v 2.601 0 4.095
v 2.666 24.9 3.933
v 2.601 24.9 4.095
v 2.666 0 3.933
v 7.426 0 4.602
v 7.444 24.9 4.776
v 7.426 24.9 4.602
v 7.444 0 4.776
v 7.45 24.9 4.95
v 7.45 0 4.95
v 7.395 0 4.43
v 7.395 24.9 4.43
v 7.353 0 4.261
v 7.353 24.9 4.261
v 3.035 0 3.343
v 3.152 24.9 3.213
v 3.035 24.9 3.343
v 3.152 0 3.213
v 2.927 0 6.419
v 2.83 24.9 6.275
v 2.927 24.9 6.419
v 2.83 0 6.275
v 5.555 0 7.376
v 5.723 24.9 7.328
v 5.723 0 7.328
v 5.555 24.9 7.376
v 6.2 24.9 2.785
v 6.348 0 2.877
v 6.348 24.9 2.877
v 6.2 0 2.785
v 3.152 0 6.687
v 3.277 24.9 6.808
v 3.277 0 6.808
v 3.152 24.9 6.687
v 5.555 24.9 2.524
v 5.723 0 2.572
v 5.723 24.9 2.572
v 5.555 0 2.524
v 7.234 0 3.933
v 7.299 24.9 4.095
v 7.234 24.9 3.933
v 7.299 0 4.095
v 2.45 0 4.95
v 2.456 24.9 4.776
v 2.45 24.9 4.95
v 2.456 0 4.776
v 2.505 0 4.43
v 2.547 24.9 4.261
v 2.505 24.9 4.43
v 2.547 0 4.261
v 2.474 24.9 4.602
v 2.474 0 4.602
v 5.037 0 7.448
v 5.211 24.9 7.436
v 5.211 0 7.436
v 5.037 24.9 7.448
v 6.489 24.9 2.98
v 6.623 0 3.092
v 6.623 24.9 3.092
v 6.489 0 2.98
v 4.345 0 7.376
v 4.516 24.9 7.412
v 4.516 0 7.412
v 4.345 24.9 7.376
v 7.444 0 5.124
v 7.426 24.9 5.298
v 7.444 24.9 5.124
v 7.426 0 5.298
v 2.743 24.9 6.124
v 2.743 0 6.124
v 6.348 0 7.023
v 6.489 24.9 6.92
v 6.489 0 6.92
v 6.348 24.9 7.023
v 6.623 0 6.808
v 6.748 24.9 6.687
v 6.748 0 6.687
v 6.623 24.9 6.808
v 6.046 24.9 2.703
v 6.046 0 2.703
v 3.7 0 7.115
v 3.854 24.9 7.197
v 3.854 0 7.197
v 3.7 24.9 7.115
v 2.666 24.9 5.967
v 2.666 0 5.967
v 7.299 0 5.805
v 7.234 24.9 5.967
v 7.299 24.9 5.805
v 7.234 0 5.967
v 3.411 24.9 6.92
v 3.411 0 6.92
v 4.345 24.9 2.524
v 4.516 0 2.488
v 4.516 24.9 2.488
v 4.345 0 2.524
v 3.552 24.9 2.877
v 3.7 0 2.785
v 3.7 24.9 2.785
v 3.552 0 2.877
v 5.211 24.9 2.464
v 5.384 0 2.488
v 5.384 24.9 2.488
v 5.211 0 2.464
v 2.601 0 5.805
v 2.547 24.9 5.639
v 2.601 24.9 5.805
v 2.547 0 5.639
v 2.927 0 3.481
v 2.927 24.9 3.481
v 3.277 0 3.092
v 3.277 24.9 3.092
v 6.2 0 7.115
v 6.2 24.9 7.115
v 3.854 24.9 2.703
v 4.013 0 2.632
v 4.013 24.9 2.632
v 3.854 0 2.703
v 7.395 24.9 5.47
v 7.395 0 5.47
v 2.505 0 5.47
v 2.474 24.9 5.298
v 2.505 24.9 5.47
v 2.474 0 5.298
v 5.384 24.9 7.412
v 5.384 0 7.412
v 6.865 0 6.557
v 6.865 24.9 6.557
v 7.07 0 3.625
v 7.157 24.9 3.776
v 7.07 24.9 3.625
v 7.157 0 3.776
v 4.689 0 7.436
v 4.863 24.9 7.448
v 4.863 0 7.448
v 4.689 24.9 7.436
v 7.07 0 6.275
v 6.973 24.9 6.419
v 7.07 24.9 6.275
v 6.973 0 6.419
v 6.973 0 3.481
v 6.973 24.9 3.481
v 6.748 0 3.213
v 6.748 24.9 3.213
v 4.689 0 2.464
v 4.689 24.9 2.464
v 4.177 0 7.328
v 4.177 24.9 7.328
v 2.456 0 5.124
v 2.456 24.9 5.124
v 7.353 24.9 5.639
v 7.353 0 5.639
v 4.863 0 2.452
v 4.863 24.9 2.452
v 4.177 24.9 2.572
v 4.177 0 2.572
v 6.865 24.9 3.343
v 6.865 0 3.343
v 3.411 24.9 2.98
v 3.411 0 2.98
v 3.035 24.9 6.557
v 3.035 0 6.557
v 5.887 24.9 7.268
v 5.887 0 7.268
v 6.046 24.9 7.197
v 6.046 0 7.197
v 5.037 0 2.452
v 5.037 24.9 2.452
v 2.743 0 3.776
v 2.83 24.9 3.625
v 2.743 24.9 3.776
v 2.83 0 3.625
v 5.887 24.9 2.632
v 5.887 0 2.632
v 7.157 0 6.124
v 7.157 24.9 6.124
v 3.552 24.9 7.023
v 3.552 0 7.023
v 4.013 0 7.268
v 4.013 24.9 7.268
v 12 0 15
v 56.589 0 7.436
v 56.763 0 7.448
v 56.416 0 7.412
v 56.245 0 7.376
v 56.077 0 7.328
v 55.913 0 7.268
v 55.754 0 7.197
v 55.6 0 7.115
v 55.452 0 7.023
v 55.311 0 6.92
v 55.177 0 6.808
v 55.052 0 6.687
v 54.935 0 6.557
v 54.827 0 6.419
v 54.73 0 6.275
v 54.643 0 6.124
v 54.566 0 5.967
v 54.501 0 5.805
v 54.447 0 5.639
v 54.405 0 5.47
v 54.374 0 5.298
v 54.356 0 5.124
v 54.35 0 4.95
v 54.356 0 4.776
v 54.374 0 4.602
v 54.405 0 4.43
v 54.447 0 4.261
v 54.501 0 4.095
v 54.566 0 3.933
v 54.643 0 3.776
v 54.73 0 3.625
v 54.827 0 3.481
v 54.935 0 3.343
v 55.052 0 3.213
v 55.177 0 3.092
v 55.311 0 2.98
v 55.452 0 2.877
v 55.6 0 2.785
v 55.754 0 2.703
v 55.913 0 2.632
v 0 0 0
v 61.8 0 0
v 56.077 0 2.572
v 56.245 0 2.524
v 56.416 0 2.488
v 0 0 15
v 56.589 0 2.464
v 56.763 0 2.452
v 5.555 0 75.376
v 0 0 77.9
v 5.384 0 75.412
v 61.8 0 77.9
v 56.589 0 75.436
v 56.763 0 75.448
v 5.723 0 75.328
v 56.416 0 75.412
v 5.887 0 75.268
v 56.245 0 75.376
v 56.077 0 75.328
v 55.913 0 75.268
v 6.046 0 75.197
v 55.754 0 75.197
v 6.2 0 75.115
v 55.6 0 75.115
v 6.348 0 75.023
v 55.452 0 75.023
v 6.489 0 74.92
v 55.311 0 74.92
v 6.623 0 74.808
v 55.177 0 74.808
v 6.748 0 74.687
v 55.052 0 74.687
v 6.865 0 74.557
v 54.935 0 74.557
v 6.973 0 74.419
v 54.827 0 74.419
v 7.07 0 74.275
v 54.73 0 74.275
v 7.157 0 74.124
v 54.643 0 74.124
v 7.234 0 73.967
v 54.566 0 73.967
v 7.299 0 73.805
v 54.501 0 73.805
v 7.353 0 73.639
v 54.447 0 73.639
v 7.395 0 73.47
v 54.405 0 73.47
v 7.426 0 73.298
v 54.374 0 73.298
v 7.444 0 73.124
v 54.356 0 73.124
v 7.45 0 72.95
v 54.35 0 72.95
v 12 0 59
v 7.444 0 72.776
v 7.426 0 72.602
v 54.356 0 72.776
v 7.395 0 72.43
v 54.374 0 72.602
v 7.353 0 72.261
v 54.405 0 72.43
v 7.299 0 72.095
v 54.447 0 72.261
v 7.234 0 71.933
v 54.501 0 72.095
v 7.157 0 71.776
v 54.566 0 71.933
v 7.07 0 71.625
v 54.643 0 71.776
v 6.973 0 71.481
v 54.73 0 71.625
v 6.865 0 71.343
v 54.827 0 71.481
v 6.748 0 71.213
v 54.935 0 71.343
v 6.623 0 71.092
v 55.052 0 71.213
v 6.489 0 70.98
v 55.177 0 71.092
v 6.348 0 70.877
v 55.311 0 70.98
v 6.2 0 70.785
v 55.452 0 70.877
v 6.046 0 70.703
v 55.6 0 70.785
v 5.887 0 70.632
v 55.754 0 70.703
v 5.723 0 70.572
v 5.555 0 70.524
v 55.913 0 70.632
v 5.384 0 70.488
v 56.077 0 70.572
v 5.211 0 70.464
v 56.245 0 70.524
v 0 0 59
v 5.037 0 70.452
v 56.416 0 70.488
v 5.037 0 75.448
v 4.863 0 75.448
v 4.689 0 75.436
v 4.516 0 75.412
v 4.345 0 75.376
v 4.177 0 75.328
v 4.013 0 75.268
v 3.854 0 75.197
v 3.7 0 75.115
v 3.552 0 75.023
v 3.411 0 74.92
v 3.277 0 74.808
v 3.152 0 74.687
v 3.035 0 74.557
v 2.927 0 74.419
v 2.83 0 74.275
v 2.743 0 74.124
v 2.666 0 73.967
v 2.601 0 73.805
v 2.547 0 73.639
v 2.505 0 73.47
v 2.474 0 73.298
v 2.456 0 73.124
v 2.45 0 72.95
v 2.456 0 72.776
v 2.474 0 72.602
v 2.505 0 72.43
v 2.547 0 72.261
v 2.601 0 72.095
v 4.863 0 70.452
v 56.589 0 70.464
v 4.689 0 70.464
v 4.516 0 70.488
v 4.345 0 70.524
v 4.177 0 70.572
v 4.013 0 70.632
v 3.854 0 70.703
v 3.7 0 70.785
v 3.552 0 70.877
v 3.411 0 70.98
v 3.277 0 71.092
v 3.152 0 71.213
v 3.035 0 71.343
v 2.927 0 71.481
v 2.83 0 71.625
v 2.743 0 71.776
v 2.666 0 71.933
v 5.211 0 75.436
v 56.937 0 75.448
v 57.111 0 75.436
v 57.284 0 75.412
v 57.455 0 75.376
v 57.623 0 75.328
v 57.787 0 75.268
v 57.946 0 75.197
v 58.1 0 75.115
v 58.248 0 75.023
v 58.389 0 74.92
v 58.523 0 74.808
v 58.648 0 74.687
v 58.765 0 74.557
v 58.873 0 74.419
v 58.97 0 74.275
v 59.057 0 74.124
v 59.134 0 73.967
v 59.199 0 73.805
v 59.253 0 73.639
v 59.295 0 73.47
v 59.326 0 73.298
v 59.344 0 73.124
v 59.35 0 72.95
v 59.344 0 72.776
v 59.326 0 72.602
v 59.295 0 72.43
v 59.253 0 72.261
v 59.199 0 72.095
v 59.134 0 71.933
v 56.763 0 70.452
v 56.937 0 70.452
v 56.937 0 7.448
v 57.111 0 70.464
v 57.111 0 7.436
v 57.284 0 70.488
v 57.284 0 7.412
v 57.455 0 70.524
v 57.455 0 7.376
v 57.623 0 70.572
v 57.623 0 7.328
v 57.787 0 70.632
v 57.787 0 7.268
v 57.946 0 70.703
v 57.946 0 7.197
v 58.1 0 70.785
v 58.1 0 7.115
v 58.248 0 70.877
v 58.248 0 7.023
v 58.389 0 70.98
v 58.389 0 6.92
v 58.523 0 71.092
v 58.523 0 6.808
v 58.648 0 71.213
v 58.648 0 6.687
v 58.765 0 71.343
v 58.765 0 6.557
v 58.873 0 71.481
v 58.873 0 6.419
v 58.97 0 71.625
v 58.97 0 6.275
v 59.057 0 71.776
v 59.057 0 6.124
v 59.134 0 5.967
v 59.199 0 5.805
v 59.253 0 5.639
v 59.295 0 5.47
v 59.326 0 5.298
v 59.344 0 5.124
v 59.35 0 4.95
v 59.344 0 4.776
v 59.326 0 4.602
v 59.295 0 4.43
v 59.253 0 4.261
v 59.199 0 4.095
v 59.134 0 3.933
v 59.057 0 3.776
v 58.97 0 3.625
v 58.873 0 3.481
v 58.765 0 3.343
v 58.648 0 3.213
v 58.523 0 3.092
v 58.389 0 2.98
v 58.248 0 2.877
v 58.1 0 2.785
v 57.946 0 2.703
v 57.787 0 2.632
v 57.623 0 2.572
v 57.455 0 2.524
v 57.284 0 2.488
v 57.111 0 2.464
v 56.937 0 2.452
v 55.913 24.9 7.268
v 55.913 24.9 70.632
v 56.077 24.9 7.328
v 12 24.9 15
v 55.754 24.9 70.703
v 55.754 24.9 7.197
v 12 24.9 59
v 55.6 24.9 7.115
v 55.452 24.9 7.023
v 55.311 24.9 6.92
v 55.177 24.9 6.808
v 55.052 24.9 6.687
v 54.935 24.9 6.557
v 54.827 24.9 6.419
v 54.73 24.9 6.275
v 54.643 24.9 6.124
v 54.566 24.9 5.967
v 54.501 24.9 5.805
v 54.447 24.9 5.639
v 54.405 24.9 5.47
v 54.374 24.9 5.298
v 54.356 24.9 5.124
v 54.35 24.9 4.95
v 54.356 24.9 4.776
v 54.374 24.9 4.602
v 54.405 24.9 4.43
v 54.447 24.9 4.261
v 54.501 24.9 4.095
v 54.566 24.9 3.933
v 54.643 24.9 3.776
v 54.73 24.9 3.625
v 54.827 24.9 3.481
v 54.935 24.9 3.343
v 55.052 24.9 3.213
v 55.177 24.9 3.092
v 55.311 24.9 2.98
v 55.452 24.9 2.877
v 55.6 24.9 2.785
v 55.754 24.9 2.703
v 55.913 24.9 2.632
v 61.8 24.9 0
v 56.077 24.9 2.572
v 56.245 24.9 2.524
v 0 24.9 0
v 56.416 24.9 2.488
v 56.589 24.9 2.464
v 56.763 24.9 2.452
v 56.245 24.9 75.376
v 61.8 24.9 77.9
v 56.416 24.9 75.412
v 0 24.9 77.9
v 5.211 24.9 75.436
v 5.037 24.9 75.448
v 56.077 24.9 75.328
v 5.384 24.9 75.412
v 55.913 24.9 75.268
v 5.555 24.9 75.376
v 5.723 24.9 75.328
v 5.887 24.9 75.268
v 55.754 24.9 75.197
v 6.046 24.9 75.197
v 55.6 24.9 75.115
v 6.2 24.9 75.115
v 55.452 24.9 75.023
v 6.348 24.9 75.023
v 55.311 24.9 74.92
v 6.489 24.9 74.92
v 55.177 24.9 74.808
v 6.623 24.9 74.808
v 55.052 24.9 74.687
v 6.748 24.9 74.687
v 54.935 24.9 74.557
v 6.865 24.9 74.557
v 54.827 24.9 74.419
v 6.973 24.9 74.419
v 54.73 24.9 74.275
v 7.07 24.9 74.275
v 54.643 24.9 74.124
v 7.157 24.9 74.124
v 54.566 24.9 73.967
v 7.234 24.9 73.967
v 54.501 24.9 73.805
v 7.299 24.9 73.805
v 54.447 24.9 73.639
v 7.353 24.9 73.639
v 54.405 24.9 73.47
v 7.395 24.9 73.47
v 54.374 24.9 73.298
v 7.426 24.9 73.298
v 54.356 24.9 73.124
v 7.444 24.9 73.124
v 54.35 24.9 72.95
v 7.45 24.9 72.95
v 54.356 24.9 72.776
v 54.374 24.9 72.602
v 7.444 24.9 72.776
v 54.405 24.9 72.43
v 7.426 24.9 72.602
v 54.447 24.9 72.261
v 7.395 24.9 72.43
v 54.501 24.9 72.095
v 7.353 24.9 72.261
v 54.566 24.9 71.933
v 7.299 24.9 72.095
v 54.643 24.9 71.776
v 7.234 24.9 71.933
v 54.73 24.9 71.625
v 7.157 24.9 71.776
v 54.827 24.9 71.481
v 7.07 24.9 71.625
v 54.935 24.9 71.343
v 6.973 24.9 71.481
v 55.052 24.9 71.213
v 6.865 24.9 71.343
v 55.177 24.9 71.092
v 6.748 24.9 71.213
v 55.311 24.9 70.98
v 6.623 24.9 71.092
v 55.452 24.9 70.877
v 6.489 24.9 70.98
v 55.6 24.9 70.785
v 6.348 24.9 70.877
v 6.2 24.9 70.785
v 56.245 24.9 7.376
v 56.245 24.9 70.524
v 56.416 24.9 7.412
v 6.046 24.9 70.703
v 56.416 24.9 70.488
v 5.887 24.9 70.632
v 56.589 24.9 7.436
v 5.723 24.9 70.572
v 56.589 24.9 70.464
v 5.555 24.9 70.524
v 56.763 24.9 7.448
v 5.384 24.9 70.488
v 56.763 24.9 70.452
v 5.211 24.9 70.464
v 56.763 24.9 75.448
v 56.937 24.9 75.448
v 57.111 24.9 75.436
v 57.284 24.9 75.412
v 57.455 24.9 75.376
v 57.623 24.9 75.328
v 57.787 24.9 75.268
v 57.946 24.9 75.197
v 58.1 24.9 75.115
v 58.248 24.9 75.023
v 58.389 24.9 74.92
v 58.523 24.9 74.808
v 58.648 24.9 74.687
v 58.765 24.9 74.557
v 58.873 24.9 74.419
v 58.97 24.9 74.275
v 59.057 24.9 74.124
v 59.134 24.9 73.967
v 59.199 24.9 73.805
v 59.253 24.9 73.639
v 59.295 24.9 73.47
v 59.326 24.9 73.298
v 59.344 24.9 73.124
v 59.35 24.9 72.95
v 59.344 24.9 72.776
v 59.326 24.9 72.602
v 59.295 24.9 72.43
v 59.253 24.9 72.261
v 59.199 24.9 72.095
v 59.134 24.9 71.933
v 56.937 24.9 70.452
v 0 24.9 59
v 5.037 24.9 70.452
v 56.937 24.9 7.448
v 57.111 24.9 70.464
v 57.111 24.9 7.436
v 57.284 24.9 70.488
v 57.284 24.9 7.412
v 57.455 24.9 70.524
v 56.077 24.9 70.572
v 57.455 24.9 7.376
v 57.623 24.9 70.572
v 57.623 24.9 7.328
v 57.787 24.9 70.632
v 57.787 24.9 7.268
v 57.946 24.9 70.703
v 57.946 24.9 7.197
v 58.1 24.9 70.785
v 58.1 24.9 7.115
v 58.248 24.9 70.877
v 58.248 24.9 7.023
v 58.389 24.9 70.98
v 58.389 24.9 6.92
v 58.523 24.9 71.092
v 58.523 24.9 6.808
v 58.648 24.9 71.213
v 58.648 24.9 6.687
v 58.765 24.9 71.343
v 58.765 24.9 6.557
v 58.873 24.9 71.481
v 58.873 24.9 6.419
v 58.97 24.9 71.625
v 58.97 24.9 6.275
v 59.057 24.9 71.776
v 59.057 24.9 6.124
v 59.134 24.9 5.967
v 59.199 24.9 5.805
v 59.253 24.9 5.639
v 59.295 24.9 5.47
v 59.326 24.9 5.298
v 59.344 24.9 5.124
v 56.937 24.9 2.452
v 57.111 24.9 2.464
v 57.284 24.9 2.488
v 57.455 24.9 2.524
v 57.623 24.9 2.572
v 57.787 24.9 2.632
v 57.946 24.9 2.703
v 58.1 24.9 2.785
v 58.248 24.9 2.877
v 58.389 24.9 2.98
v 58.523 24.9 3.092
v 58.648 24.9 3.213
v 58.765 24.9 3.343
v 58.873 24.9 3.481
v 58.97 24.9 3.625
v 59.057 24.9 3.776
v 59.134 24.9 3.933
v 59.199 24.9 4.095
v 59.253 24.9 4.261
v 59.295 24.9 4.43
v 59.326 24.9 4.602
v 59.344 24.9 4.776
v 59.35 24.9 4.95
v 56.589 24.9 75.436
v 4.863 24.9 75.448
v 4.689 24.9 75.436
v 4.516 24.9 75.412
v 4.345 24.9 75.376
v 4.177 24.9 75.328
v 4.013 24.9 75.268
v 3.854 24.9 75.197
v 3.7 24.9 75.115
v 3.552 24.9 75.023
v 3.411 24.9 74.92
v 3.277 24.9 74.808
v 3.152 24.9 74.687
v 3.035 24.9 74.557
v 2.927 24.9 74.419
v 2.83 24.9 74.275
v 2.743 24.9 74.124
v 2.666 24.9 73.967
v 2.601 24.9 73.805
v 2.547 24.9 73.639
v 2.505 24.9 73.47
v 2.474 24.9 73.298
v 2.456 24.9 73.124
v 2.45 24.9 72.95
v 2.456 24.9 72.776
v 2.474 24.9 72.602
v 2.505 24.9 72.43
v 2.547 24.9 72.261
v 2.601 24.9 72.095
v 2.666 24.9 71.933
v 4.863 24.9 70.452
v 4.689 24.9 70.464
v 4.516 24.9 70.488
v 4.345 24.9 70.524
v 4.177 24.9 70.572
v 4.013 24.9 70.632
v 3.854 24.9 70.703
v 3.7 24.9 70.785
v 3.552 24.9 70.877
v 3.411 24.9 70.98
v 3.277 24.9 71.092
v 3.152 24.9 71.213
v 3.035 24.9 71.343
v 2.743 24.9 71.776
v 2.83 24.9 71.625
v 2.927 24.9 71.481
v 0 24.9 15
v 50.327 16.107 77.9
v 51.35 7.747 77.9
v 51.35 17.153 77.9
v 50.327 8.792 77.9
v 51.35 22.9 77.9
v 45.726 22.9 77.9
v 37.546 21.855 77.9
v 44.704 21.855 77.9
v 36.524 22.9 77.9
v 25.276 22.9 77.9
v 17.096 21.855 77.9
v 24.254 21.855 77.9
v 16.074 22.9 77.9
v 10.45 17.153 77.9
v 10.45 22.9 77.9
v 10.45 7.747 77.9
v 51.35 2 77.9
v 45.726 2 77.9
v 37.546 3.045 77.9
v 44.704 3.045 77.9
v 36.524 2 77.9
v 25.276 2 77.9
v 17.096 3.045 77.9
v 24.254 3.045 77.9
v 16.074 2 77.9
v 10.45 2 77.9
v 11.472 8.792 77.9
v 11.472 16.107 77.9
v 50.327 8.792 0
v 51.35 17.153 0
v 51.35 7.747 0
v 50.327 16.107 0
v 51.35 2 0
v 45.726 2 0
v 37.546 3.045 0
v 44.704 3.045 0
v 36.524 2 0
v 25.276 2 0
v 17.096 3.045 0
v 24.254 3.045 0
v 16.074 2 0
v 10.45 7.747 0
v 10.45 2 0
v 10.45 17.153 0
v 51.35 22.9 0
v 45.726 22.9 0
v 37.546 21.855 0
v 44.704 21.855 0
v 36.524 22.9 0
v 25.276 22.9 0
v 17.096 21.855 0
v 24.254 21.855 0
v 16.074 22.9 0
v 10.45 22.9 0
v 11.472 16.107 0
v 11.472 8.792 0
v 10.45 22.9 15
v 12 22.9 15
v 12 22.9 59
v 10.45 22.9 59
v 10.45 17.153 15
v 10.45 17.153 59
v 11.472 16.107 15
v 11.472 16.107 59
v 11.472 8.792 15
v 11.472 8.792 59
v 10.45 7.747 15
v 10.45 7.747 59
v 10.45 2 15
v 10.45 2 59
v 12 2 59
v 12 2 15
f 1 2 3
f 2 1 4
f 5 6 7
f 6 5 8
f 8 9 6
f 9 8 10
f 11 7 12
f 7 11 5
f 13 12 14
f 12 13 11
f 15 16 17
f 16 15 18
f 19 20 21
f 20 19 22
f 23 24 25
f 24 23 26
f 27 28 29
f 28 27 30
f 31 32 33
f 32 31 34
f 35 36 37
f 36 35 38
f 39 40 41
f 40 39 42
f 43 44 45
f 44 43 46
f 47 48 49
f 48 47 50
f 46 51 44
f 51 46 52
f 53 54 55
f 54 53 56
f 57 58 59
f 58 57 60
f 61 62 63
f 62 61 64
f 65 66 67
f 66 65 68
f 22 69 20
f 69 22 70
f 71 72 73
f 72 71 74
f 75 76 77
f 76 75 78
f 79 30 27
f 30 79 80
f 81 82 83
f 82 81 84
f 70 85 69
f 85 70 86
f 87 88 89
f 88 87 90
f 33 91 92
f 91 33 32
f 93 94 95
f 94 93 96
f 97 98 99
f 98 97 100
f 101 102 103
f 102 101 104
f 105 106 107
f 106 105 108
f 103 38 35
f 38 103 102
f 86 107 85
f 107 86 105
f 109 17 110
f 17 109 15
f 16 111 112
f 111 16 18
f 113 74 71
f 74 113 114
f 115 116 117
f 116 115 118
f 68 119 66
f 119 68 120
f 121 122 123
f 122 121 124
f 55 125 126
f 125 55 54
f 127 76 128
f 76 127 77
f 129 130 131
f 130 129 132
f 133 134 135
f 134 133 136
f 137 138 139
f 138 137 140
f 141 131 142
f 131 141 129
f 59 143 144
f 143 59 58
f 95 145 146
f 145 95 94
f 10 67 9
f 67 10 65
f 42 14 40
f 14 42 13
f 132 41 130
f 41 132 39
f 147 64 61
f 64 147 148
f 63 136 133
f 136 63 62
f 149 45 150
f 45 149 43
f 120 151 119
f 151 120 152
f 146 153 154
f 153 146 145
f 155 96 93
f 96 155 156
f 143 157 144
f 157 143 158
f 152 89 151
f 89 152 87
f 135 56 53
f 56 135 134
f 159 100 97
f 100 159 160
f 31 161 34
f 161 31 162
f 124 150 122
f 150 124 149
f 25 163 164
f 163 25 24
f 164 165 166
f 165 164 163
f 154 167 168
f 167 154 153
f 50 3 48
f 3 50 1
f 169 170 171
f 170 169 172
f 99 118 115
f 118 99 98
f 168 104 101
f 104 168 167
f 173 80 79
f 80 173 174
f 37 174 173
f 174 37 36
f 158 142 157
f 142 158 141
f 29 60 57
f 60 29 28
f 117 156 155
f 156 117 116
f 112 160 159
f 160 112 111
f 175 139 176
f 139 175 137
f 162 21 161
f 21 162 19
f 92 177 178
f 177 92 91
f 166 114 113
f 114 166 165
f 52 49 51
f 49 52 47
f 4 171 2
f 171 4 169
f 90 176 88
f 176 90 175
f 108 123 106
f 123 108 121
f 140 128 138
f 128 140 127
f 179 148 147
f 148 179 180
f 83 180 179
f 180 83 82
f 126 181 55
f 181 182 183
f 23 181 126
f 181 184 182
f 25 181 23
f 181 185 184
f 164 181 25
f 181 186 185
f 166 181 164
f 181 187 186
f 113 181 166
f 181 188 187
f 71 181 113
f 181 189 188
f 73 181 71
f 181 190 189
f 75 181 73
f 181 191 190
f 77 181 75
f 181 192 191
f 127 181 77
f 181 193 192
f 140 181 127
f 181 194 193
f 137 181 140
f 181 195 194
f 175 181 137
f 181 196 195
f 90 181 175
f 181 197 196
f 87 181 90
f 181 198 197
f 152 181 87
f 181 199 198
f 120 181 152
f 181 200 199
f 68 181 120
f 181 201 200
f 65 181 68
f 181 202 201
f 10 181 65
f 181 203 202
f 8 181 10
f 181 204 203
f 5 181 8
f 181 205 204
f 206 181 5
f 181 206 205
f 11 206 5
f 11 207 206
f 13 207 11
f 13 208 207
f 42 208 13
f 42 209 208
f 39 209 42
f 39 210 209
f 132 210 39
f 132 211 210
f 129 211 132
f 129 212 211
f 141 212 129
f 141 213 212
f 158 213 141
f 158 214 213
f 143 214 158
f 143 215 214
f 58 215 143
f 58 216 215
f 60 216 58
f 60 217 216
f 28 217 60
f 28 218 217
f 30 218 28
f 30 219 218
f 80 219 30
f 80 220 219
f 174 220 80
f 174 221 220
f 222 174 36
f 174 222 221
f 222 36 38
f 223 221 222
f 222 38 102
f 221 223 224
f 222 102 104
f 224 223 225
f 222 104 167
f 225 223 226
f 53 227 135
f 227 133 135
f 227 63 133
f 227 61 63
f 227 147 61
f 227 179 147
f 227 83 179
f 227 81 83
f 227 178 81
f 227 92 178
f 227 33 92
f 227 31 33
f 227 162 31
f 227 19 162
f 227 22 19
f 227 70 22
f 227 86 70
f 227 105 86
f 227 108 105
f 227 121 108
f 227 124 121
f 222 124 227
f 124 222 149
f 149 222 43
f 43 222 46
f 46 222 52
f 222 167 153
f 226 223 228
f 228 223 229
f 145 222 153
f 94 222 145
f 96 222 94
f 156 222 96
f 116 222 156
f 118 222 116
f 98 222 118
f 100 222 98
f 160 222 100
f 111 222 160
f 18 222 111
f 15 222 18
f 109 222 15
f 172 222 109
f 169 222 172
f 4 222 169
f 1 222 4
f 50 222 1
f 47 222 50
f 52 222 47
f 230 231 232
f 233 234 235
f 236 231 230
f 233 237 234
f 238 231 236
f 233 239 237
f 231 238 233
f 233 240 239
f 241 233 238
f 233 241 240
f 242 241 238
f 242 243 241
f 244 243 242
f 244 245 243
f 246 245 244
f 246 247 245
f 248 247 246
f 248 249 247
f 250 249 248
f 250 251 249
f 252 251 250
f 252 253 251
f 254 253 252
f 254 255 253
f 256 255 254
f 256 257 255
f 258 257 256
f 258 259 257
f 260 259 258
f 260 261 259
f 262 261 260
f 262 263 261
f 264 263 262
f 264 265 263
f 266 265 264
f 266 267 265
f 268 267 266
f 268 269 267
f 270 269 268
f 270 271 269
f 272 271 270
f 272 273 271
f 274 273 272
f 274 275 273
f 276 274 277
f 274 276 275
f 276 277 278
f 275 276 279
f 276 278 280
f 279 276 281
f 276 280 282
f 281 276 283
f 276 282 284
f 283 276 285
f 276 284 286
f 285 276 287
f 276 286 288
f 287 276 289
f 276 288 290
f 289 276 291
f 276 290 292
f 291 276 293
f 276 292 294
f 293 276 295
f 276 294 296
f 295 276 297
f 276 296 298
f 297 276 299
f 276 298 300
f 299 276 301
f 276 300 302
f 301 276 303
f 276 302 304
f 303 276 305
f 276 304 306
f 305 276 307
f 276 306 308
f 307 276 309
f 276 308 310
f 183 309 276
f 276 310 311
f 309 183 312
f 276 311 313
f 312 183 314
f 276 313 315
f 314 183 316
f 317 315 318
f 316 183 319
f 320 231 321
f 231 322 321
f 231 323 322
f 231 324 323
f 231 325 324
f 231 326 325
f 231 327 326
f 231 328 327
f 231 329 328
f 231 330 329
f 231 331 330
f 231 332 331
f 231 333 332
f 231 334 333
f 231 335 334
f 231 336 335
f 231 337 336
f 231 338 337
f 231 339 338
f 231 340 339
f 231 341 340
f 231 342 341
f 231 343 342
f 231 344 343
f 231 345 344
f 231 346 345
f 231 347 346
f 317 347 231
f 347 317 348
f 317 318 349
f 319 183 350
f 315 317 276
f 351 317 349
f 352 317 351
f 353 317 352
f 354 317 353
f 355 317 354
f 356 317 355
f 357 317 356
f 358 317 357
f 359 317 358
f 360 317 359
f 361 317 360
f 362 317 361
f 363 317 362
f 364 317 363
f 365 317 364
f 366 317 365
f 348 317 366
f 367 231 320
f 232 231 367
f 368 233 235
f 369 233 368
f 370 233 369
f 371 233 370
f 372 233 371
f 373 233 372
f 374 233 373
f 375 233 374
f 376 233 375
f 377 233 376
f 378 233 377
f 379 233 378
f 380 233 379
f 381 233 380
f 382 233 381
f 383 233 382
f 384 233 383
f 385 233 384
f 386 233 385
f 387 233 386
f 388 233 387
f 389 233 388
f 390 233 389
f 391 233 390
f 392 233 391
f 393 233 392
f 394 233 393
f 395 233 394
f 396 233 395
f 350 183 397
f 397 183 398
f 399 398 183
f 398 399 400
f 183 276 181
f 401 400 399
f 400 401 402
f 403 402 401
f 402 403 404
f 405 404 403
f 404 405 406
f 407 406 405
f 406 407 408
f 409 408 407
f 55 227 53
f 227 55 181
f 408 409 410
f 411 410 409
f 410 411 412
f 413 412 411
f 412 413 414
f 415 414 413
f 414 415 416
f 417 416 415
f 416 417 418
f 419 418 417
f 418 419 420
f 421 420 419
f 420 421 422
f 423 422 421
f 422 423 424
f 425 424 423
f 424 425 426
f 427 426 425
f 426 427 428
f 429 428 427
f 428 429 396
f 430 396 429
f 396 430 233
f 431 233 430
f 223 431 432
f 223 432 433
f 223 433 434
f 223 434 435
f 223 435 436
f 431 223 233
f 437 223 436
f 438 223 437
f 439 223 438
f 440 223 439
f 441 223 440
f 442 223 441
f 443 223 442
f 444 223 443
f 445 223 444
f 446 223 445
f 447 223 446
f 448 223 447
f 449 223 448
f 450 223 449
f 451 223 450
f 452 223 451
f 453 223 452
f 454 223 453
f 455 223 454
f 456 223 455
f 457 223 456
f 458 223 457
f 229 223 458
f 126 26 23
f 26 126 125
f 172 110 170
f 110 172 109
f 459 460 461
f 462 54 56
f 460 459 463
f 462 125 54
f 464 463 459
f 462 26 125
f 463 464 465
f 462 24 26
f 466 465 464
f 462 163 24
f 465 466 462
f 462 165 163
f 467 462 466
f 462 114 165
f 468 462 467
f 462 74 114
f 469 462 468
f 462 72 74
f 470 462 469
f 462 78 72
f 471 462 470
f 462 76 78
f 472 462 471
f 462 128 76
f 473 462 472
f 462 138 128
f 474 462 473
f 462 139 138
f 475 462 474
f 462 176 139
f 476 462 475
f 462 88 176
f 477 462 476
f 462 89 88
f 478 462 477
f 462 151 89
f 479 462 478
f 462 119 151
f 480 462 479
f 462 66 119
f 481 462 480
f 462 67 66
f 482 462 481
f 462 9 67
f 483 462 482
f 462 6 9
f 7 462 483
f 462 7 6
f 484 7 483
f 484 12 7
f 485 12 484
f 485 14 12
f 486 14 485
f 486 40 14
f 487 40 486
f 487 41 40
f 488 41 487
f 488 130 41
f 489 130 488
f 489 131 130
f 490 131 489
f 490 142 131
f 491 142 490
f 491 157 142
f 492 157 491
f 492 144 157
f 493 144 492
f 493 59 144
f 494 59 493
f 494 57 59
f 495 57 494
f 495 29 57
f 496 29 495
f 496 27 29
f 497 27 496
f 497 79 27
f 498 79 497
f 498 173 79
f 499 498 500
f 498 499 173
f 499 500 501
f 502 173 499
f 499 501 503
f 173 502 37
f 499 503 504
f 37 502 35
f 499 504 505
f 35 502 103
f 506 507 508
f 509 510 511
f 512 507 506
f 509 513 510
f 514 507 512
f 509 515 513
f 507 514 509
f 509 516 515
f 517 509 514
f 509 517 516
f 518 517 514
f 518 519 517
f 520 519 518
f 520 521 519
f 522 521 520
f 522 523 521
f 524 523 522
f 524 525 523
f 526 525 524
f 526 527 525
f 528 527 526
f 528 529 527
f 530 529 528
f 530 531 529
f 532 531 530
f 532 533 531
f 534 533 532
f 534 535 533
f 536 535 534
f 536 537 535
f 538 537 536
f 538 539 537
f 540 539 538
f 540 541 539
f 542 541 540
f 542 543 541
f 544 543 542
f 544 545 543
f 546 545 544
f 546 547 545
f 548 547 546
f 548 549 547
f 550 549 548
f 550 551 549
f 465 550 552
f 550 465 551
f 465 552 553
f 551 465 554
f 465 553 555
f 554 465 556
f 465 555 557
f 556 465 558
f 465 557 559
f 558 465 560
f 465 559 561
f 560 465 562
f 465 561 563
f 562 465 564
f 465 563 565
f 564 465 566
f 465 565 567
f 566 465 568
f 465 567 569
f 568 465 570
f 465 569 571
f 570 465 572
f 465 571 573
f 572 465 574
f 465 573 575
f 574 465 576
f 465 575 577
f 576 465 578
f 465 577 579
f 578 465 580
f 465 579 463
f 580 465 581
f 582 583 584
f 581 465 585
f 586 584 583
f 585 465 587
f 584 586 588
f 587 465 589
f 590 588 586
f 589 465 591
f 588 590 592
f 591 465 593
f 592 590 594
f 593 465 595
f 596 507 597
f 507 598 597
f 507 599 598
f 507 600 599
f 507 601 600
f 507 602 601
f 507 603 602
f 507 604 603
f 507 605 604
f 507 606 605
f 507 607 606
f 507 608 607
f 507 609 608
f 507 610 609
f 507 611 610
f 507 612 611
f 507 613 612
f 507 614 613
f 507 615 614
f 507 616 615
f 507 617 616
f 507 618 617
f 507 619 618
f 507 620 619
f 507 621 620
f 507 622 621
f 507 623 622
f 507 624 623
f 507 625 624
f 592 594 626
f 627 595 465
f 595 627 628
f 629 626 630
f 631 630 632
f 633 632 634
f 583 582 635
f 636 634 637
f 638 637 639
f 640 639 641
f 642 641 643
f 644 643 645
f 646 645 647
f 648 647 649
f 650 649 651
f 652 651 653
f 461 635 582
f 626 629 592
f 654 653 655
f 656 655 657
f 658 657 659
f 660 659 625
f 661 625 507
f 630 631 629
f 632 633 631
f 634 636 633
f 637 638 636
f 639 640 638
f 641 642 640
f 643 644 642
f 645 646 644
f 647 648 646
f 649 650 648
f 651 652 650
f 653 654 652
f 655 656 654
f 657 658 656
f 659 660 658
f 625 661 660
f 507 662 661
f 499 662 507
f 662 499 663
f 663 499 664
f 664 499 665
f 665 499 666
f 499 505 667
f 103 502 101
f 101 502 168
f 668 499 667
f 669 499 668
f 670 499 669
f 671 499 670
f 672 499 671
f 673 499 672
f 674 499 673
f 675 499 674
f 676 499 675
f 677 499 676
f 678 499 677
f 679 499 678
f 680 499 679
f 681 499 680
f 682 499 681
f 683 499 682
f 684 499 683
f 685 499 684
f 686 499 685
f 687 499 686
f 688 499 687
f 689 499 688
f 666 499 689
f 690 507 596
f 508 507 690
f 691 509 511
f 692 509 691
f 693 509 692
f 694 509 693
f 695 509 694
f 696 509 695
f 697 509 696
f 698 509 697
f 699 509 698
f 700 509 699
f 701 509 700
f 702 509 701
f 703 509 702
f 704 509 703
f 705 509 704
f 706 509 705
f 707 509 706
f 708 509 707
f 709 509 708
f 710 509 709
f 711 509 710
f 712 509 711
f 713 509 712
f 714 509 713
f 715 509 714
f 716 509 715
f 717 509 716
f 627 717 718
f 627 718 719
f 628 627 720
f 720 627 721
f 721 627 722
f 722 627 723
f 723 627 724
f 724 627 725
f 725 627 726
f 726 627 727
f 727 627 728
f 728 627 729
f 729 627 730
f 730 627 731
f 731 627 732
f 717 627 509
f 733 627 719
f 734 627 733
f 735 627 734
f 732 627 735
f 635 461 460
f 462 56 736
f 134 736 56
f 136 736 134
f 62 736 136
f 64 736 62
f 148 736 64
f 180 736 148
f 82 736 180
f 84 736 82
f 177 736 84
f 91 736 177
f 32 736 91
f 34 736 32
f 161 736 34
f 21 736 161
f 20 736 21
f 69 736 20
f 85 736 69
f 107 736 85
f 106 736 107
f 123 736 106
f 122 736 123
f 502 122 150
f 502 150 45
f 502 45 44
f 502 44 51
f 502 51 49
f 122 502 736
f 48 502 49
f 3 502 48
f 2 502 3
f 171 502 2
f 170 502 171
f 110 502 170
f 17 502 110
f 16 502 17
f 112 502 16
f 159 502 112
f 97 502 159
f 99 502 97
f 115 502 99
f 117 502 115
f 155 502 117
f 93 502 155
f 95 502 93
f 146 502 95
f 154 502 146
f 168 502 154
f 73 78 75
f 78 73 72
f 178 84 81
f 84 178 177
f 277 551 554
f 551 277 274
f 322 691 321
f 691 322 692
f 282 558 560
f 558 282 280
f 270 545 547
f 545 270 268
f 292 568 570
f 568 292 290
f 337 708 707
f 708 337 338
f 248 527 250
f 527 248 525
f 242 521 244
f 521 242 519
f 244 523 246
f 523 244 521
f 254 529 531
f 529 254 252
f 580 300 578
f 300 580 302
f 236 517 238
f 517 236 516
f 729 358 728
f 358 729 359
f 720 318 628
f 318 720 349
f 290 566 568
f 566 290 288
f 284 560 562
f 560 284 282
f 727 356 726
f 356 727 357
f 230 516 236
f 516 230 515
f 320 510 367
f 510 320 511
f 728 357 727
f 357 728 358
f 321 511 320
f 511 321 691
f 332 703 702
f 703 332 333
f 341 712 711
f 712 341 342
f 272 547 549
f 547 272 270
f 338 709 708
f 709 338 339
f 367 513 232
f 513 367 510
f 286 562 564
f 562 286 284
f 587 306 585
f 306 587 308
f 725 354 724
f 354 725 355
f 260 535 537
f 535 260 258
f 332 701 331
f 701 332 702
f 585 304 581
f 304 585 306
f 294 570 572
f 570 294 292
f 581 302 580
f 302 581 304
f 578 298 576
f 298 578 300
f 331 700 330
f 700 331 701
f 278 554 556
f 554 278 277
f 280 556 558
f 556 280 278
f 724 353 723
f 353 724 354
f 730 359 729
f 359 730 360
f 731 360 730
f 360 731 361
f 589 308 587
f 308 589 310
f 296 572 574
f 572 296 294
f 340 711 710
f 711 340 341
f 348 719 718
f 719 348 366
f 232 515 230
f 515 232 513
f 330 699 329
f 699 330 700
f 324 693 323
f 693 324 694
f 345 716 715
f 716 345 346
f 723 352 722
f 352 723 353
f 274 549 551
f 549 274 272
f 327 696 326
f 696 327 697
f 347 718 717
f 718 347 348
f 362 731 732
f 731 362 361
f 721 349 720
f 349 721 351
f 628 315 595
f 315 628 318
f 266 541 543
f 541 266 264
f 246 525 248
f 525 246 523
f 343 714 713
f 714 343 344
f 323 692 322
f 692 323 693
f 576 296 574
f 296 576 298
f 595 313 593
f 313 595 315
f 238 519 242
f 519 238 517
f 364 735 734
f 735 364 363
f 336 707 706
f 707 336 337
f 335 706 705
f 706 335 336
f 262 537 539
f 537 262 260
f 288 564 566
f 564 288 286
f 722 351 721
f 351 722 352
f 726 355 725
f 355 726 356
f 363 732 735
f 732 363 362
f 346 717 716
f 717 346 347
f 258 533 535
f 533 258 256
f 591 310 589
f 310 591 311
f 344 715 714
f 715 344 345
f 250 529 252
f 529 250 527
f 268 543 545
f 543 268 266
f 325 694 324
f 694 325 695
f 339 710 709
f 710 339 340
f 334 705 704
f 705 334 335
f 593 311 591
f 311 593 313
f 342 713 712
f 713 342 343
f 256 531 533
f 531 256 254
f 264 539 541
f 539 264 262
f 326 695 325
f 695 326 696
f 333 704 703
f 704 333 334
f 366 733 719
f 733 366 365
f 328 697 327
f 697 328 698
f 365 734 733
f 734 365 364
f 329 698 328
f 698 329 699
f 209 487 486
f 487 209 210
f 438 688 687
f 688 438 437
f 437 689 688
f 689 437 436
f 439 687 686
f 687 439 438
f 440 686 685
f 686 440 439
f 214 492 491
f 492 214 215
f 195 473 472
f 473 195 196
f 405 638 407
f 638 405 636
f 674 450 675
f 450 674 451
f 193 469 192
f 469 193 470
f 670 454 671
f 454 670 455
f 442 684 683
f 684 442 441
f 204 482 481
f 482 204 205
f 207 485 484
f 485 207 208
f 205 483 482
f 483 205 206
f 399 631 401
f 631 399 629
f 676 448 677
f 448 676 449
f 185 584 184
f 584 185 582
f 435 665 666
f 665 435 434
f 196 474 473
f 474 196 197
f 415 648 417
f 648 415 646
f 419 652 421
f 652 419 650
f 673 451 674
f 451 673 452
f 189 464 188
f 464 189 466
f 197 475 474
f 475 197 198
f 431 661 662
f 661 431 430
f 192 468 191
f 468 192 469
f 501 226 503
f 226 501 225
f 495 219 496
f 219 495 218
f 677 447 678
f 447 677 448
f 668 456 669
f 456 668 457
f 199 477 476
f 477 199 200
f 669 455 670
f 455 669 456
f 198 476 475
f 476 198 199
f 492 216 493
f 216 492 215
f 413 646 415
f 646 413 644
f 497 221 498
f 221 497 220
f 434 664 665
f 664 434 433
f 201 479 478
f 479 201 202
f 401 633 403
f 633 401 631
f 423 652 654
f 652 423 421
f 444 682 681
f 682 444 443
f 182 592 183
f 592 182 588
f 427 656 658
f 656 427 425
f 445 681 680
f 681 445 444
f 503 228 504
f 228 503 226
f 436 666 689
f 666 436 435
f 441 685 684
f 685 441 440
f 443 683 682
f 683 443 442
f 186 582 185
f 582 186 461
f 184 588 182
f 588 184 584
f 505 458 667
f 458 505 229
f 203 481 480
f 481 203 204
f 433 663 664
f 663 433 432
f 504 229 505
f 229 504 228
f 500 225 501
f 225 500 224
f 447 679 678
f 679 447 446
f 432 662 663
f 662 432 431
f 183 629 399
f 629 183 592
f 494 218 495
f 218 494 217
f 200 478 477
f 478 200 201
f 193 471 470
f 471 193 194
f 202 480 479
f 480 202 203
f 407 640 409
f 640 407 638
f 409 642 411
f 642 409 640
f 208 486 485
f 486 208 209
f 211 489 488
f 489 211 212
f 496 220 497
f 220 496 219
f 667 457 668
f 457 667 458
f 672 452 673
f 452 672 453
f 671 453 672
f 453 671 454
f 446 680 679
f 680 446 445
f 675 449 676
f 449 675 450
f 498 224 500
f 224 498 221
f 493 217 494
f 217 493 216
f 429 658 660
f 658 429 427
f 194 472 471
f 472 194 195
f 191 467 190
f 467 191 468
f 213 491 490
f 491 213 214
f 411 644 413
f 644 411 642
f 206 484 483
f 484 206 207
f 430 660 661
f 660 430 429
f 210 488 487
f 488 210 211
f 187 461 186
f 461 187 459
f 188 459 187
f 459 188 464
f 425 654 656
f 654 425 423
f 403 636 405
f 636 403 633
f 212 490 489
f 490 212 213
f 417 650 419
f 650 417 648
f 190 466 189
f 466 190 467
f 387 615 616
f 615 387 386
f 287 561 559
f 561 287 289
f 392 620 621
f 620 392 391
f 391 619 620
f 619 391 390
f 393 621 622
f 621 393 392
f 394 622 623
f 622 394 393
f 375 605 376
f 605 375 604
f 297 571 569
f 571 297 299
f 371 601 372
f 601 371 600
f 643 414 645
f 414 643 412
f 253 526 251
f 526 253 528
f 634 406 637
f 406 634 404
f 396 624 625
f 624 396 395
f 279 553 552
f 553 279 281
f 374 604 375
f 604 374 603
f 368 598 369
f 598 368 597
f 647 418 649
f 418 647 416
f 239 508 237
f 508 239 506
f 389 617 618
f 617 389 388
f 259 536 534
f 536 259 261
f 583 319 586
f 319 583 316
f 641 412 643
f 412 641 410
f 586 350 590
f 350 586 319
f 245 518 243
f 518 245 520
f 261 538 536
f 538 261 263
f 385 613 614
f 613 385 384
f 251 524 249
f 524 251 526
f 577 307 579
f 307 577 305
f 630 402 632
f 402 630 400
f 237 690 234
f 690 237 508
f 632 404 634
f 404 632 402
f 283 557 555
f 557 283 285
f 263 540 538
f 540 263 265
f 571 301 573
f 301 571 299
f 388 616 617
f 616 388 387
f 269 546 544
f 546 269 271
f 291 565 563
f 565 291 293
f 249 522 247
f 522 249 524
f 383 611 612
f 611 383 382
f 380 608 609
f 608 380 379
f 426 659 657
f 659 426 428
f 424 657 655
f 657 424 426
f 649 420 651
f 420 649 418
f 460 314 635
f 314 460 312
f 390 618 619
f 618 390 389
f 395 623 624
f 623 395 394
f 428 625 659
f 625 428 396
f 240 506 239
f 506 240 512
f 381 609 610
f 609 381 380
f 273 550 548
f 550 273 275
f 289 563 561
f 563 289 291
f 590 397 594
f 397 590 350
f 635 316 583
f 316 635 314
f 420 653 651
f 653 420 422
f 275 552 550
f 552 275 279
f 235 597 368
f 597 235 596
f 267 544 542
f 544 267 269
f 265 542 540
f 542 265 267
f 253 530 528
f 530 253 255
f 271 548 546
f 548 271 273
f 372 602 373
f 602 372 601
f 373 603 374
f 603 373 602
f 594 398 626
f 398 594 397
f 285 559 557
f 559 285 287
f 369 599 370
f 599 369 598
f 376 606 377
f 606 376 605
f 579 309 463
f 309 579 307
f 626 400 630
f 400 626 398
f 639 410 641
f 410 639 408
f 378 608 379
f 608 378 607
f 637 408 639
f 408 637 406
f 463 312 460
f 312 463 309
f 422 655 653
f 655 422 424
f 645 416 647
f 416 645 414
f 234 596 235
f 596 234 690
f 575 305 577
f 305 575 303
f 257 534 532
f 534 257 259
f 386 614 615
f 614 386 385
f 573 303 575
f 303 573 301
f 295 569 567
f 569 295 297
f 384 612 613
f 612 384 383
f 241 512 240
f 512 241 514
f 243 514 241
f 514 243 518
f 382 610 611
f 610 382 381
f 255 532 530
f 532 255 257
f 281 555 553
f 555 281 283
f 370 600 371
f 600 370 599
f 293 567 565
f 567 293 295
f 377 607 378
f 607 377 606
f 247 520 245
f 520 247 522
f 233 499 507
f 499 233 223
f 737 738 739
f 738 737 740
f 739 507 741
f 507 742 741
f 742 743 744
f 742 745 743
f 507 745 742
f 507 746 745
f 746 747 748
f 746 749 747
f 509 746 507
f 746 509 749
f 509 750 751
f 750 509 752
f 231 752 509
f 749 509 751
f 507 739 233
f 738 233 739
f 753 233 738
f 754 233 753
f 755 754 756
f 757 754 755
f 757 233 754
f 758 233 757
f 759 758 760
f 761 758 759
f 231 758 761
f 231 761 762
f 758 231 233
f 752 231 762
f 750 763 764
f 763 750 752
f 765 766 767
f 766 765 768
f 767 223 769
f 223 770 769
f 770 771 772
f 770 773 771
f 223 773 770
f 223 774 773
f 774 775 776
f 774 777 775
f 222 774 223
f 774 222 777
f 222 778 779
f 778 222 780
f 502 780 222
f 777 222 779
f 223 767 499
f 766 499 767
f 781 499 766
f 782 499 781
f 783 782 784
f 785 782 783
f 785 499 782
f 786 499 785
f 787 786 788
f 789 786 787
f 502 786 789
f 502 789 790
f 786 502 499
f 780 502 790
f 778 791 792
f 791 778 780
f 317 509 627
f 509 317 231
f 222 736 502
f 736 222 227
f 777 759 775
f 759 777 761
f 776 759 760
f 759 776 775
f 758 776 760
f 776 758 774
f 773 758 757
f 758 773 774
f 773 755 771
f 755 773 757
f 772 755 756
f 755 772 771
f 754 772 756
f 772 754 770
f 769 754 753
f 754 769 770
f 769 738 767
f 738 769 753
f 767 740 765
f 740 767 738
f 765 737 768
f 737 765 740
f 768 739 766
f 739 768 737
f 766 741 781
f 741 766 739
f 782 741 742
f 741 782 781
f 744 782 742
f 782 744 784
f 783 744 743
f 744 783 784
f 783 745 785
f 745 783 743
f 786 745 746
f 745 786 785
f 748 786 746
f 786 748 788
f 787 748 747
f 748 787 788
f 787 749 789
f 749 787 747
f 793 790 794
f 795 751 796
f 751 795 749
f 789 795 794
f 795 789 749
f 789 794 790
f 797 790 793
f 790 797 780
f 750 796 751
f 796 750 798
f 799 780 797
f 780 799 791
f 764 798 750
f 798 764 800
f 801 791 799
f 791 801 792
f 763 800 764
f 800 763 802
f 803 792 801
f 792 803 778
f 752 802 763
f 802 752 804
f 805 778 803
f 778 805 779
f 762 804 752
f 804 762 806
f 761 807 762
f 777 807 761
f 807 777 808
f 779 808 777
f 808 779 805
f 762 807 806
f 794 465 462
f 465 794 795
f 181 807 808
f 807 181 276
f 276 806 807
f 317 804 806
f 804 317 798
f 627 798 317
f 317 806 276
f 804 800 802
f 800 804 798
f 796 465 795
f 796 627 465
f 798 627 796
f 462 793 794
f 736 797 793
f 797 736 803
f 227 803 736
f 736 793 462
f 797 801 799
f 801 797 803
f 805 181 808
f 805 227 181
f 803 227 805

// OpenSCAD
// file: constants.scad
tolerance=0.7;
oversize = 0.7;
lengthHoleSpacing=20;
wallWidth=5;
//vslotIndentHeight=4;
vslotIndentHeight= 1;
//indentWidthOutside = 6;
indentWidthOutside = 9;
//indentWidthInside = 6;
indentWidthInside = 7;
sectionWidth=20;
profileSize=20;
sectionCountWidth = 2;
sectionCountDepth = 1;
extrusionWidth=profileSize*sectionCountWidth;
extrusionDepth=profileSize*sectionCountDepth;
nema17Width = 42.3;
nema17HoleRadius = 11.05 + tolerance/2;
nema17Height = 3.5*extrusionWidth;
nema17BoltSpacing = 31;
nema17BeltHoleHeight = 8;
nema17BeltOffsetFromTopExtrusion = 8;
nema17BeltHeightWidth = 15;
wallSpacing=5;
screwHeight = wallSpacing+vslotIndentHeight;
// main file
use <vslot.scad>;

sectionCountWidth=2;
sectionCountDepth=1;
screwDiameter=5;
tolerance=.9;
wallWidth=2 + tolerance/2;
profileSize=20;
sideNum = 1;

holeDistWidth=68;
holeDistHeight=51.9;
allTogether = true;
blockHeight = wallWidth*2 + sectionCountWidth*profileSize;
blockWidth = wallWidth*2 + sectionCountDepth*profileSize;
cubeX = holeDistHeight+screwDiameter+2*wallWidth;
cubeZ = holeDistWidth+screwDiameter+2*wallWidth;

mirror([sideNum == 1 ? 0 : 1, 0, 0])
difference() {
    cube([cubeX,blockWidth,cubeZ]);
    translate([wallWidth+screwDiameter/2, 0, wallWidth+screwDiameter/2])
    {
        rotate([-90,0,0])
            cylinder(r=screwDiameter/2,h=blockWidth, $fn=90);
        translate([0, 0, holeDistWidth])
            rotate([-90,0,0])
            cylinder(r=screwDiameter/2,h=blockWidth, $fn=90);
    }
    translate([wallWidth+screwDiameter/2 + holeDistHeight, 0, wallWidth+screwDiameter/2])
    {
        rotate([-90,0,0])
            cylinder(r=screwDiameter/2,h=blockWidth, $fn=90);
        translate([0, 0, holeDistWidth])
            rotate([-90,0,0])
            cylinder(r=screwDiameter/2,h=blockWidth, $fn=90);
    }
    translate([(cubeX-(sectionCountWidth*profileSize))/2,wallWidth,0])
        drawVslotExtrusion(
            height=cubeZ,
            sectionCountWidth=sectionCountWidth, 
            sectionCountDepth=sectionCountDepth, 
            topIndent=true, 
            rightIndent=true, 
            leftIndent=true, 
            bottomIndent=true, 
            oversize=tolerance
            //screwOffset,
            //leftScrewPoints = [],
            //rightScrewPoints = [],
            //topScrewPoints = [],
            //bottomScrewPoints = [],
            //backScrewPoints = []
    );
    translate([0,0,15])
        cube([12,blockWidth,44]);
    if (!allTogether) {
        translate ([sideNum == 1 ? 0 : cubeX, 0, 0])
        mirror([sideNum == 1 ? 0 : 1, 0, 0]) {
            linear_extrude(h=cubeZ) 
                polygon(points=[
                    [0,wallWidth-tolerance/2], 
                    [(cubeX-(sectionCountWidth*profileSize))/2-tolerance/2,wallWidth-tolerance/2],
                    [cubeX-(cubeX-(sectionCountWidth*profileSize))/2+tolerance/2,blockWidth-wallWidth+tolerance/2],
                    [cubeX+tolerance/2, blockWidth-wallWidth+tolerance/2],
                    [cubeX+tolerance/2, blockWidth+tolerance/2],
                    [0, blockWidth]
                ]);
        }
    }
    /*
    translate([-(holeDistHeight-blockHeight)/2+holeDistHeight, 0, cylinderRadius])
        rotate([-90,0,0])
        cylinder(r=cylinderRadius,h=blockWidth, $fn=90);
    translate([-(holeDistHeight-blockHeight)/2+holeDistHeight, 0, cylinderRadius+holeDistWidth])
        rotate([-90,0,0])
        cylinder(r=cylinderRadius,h=blockWidth, $fn=90);
    */
}
